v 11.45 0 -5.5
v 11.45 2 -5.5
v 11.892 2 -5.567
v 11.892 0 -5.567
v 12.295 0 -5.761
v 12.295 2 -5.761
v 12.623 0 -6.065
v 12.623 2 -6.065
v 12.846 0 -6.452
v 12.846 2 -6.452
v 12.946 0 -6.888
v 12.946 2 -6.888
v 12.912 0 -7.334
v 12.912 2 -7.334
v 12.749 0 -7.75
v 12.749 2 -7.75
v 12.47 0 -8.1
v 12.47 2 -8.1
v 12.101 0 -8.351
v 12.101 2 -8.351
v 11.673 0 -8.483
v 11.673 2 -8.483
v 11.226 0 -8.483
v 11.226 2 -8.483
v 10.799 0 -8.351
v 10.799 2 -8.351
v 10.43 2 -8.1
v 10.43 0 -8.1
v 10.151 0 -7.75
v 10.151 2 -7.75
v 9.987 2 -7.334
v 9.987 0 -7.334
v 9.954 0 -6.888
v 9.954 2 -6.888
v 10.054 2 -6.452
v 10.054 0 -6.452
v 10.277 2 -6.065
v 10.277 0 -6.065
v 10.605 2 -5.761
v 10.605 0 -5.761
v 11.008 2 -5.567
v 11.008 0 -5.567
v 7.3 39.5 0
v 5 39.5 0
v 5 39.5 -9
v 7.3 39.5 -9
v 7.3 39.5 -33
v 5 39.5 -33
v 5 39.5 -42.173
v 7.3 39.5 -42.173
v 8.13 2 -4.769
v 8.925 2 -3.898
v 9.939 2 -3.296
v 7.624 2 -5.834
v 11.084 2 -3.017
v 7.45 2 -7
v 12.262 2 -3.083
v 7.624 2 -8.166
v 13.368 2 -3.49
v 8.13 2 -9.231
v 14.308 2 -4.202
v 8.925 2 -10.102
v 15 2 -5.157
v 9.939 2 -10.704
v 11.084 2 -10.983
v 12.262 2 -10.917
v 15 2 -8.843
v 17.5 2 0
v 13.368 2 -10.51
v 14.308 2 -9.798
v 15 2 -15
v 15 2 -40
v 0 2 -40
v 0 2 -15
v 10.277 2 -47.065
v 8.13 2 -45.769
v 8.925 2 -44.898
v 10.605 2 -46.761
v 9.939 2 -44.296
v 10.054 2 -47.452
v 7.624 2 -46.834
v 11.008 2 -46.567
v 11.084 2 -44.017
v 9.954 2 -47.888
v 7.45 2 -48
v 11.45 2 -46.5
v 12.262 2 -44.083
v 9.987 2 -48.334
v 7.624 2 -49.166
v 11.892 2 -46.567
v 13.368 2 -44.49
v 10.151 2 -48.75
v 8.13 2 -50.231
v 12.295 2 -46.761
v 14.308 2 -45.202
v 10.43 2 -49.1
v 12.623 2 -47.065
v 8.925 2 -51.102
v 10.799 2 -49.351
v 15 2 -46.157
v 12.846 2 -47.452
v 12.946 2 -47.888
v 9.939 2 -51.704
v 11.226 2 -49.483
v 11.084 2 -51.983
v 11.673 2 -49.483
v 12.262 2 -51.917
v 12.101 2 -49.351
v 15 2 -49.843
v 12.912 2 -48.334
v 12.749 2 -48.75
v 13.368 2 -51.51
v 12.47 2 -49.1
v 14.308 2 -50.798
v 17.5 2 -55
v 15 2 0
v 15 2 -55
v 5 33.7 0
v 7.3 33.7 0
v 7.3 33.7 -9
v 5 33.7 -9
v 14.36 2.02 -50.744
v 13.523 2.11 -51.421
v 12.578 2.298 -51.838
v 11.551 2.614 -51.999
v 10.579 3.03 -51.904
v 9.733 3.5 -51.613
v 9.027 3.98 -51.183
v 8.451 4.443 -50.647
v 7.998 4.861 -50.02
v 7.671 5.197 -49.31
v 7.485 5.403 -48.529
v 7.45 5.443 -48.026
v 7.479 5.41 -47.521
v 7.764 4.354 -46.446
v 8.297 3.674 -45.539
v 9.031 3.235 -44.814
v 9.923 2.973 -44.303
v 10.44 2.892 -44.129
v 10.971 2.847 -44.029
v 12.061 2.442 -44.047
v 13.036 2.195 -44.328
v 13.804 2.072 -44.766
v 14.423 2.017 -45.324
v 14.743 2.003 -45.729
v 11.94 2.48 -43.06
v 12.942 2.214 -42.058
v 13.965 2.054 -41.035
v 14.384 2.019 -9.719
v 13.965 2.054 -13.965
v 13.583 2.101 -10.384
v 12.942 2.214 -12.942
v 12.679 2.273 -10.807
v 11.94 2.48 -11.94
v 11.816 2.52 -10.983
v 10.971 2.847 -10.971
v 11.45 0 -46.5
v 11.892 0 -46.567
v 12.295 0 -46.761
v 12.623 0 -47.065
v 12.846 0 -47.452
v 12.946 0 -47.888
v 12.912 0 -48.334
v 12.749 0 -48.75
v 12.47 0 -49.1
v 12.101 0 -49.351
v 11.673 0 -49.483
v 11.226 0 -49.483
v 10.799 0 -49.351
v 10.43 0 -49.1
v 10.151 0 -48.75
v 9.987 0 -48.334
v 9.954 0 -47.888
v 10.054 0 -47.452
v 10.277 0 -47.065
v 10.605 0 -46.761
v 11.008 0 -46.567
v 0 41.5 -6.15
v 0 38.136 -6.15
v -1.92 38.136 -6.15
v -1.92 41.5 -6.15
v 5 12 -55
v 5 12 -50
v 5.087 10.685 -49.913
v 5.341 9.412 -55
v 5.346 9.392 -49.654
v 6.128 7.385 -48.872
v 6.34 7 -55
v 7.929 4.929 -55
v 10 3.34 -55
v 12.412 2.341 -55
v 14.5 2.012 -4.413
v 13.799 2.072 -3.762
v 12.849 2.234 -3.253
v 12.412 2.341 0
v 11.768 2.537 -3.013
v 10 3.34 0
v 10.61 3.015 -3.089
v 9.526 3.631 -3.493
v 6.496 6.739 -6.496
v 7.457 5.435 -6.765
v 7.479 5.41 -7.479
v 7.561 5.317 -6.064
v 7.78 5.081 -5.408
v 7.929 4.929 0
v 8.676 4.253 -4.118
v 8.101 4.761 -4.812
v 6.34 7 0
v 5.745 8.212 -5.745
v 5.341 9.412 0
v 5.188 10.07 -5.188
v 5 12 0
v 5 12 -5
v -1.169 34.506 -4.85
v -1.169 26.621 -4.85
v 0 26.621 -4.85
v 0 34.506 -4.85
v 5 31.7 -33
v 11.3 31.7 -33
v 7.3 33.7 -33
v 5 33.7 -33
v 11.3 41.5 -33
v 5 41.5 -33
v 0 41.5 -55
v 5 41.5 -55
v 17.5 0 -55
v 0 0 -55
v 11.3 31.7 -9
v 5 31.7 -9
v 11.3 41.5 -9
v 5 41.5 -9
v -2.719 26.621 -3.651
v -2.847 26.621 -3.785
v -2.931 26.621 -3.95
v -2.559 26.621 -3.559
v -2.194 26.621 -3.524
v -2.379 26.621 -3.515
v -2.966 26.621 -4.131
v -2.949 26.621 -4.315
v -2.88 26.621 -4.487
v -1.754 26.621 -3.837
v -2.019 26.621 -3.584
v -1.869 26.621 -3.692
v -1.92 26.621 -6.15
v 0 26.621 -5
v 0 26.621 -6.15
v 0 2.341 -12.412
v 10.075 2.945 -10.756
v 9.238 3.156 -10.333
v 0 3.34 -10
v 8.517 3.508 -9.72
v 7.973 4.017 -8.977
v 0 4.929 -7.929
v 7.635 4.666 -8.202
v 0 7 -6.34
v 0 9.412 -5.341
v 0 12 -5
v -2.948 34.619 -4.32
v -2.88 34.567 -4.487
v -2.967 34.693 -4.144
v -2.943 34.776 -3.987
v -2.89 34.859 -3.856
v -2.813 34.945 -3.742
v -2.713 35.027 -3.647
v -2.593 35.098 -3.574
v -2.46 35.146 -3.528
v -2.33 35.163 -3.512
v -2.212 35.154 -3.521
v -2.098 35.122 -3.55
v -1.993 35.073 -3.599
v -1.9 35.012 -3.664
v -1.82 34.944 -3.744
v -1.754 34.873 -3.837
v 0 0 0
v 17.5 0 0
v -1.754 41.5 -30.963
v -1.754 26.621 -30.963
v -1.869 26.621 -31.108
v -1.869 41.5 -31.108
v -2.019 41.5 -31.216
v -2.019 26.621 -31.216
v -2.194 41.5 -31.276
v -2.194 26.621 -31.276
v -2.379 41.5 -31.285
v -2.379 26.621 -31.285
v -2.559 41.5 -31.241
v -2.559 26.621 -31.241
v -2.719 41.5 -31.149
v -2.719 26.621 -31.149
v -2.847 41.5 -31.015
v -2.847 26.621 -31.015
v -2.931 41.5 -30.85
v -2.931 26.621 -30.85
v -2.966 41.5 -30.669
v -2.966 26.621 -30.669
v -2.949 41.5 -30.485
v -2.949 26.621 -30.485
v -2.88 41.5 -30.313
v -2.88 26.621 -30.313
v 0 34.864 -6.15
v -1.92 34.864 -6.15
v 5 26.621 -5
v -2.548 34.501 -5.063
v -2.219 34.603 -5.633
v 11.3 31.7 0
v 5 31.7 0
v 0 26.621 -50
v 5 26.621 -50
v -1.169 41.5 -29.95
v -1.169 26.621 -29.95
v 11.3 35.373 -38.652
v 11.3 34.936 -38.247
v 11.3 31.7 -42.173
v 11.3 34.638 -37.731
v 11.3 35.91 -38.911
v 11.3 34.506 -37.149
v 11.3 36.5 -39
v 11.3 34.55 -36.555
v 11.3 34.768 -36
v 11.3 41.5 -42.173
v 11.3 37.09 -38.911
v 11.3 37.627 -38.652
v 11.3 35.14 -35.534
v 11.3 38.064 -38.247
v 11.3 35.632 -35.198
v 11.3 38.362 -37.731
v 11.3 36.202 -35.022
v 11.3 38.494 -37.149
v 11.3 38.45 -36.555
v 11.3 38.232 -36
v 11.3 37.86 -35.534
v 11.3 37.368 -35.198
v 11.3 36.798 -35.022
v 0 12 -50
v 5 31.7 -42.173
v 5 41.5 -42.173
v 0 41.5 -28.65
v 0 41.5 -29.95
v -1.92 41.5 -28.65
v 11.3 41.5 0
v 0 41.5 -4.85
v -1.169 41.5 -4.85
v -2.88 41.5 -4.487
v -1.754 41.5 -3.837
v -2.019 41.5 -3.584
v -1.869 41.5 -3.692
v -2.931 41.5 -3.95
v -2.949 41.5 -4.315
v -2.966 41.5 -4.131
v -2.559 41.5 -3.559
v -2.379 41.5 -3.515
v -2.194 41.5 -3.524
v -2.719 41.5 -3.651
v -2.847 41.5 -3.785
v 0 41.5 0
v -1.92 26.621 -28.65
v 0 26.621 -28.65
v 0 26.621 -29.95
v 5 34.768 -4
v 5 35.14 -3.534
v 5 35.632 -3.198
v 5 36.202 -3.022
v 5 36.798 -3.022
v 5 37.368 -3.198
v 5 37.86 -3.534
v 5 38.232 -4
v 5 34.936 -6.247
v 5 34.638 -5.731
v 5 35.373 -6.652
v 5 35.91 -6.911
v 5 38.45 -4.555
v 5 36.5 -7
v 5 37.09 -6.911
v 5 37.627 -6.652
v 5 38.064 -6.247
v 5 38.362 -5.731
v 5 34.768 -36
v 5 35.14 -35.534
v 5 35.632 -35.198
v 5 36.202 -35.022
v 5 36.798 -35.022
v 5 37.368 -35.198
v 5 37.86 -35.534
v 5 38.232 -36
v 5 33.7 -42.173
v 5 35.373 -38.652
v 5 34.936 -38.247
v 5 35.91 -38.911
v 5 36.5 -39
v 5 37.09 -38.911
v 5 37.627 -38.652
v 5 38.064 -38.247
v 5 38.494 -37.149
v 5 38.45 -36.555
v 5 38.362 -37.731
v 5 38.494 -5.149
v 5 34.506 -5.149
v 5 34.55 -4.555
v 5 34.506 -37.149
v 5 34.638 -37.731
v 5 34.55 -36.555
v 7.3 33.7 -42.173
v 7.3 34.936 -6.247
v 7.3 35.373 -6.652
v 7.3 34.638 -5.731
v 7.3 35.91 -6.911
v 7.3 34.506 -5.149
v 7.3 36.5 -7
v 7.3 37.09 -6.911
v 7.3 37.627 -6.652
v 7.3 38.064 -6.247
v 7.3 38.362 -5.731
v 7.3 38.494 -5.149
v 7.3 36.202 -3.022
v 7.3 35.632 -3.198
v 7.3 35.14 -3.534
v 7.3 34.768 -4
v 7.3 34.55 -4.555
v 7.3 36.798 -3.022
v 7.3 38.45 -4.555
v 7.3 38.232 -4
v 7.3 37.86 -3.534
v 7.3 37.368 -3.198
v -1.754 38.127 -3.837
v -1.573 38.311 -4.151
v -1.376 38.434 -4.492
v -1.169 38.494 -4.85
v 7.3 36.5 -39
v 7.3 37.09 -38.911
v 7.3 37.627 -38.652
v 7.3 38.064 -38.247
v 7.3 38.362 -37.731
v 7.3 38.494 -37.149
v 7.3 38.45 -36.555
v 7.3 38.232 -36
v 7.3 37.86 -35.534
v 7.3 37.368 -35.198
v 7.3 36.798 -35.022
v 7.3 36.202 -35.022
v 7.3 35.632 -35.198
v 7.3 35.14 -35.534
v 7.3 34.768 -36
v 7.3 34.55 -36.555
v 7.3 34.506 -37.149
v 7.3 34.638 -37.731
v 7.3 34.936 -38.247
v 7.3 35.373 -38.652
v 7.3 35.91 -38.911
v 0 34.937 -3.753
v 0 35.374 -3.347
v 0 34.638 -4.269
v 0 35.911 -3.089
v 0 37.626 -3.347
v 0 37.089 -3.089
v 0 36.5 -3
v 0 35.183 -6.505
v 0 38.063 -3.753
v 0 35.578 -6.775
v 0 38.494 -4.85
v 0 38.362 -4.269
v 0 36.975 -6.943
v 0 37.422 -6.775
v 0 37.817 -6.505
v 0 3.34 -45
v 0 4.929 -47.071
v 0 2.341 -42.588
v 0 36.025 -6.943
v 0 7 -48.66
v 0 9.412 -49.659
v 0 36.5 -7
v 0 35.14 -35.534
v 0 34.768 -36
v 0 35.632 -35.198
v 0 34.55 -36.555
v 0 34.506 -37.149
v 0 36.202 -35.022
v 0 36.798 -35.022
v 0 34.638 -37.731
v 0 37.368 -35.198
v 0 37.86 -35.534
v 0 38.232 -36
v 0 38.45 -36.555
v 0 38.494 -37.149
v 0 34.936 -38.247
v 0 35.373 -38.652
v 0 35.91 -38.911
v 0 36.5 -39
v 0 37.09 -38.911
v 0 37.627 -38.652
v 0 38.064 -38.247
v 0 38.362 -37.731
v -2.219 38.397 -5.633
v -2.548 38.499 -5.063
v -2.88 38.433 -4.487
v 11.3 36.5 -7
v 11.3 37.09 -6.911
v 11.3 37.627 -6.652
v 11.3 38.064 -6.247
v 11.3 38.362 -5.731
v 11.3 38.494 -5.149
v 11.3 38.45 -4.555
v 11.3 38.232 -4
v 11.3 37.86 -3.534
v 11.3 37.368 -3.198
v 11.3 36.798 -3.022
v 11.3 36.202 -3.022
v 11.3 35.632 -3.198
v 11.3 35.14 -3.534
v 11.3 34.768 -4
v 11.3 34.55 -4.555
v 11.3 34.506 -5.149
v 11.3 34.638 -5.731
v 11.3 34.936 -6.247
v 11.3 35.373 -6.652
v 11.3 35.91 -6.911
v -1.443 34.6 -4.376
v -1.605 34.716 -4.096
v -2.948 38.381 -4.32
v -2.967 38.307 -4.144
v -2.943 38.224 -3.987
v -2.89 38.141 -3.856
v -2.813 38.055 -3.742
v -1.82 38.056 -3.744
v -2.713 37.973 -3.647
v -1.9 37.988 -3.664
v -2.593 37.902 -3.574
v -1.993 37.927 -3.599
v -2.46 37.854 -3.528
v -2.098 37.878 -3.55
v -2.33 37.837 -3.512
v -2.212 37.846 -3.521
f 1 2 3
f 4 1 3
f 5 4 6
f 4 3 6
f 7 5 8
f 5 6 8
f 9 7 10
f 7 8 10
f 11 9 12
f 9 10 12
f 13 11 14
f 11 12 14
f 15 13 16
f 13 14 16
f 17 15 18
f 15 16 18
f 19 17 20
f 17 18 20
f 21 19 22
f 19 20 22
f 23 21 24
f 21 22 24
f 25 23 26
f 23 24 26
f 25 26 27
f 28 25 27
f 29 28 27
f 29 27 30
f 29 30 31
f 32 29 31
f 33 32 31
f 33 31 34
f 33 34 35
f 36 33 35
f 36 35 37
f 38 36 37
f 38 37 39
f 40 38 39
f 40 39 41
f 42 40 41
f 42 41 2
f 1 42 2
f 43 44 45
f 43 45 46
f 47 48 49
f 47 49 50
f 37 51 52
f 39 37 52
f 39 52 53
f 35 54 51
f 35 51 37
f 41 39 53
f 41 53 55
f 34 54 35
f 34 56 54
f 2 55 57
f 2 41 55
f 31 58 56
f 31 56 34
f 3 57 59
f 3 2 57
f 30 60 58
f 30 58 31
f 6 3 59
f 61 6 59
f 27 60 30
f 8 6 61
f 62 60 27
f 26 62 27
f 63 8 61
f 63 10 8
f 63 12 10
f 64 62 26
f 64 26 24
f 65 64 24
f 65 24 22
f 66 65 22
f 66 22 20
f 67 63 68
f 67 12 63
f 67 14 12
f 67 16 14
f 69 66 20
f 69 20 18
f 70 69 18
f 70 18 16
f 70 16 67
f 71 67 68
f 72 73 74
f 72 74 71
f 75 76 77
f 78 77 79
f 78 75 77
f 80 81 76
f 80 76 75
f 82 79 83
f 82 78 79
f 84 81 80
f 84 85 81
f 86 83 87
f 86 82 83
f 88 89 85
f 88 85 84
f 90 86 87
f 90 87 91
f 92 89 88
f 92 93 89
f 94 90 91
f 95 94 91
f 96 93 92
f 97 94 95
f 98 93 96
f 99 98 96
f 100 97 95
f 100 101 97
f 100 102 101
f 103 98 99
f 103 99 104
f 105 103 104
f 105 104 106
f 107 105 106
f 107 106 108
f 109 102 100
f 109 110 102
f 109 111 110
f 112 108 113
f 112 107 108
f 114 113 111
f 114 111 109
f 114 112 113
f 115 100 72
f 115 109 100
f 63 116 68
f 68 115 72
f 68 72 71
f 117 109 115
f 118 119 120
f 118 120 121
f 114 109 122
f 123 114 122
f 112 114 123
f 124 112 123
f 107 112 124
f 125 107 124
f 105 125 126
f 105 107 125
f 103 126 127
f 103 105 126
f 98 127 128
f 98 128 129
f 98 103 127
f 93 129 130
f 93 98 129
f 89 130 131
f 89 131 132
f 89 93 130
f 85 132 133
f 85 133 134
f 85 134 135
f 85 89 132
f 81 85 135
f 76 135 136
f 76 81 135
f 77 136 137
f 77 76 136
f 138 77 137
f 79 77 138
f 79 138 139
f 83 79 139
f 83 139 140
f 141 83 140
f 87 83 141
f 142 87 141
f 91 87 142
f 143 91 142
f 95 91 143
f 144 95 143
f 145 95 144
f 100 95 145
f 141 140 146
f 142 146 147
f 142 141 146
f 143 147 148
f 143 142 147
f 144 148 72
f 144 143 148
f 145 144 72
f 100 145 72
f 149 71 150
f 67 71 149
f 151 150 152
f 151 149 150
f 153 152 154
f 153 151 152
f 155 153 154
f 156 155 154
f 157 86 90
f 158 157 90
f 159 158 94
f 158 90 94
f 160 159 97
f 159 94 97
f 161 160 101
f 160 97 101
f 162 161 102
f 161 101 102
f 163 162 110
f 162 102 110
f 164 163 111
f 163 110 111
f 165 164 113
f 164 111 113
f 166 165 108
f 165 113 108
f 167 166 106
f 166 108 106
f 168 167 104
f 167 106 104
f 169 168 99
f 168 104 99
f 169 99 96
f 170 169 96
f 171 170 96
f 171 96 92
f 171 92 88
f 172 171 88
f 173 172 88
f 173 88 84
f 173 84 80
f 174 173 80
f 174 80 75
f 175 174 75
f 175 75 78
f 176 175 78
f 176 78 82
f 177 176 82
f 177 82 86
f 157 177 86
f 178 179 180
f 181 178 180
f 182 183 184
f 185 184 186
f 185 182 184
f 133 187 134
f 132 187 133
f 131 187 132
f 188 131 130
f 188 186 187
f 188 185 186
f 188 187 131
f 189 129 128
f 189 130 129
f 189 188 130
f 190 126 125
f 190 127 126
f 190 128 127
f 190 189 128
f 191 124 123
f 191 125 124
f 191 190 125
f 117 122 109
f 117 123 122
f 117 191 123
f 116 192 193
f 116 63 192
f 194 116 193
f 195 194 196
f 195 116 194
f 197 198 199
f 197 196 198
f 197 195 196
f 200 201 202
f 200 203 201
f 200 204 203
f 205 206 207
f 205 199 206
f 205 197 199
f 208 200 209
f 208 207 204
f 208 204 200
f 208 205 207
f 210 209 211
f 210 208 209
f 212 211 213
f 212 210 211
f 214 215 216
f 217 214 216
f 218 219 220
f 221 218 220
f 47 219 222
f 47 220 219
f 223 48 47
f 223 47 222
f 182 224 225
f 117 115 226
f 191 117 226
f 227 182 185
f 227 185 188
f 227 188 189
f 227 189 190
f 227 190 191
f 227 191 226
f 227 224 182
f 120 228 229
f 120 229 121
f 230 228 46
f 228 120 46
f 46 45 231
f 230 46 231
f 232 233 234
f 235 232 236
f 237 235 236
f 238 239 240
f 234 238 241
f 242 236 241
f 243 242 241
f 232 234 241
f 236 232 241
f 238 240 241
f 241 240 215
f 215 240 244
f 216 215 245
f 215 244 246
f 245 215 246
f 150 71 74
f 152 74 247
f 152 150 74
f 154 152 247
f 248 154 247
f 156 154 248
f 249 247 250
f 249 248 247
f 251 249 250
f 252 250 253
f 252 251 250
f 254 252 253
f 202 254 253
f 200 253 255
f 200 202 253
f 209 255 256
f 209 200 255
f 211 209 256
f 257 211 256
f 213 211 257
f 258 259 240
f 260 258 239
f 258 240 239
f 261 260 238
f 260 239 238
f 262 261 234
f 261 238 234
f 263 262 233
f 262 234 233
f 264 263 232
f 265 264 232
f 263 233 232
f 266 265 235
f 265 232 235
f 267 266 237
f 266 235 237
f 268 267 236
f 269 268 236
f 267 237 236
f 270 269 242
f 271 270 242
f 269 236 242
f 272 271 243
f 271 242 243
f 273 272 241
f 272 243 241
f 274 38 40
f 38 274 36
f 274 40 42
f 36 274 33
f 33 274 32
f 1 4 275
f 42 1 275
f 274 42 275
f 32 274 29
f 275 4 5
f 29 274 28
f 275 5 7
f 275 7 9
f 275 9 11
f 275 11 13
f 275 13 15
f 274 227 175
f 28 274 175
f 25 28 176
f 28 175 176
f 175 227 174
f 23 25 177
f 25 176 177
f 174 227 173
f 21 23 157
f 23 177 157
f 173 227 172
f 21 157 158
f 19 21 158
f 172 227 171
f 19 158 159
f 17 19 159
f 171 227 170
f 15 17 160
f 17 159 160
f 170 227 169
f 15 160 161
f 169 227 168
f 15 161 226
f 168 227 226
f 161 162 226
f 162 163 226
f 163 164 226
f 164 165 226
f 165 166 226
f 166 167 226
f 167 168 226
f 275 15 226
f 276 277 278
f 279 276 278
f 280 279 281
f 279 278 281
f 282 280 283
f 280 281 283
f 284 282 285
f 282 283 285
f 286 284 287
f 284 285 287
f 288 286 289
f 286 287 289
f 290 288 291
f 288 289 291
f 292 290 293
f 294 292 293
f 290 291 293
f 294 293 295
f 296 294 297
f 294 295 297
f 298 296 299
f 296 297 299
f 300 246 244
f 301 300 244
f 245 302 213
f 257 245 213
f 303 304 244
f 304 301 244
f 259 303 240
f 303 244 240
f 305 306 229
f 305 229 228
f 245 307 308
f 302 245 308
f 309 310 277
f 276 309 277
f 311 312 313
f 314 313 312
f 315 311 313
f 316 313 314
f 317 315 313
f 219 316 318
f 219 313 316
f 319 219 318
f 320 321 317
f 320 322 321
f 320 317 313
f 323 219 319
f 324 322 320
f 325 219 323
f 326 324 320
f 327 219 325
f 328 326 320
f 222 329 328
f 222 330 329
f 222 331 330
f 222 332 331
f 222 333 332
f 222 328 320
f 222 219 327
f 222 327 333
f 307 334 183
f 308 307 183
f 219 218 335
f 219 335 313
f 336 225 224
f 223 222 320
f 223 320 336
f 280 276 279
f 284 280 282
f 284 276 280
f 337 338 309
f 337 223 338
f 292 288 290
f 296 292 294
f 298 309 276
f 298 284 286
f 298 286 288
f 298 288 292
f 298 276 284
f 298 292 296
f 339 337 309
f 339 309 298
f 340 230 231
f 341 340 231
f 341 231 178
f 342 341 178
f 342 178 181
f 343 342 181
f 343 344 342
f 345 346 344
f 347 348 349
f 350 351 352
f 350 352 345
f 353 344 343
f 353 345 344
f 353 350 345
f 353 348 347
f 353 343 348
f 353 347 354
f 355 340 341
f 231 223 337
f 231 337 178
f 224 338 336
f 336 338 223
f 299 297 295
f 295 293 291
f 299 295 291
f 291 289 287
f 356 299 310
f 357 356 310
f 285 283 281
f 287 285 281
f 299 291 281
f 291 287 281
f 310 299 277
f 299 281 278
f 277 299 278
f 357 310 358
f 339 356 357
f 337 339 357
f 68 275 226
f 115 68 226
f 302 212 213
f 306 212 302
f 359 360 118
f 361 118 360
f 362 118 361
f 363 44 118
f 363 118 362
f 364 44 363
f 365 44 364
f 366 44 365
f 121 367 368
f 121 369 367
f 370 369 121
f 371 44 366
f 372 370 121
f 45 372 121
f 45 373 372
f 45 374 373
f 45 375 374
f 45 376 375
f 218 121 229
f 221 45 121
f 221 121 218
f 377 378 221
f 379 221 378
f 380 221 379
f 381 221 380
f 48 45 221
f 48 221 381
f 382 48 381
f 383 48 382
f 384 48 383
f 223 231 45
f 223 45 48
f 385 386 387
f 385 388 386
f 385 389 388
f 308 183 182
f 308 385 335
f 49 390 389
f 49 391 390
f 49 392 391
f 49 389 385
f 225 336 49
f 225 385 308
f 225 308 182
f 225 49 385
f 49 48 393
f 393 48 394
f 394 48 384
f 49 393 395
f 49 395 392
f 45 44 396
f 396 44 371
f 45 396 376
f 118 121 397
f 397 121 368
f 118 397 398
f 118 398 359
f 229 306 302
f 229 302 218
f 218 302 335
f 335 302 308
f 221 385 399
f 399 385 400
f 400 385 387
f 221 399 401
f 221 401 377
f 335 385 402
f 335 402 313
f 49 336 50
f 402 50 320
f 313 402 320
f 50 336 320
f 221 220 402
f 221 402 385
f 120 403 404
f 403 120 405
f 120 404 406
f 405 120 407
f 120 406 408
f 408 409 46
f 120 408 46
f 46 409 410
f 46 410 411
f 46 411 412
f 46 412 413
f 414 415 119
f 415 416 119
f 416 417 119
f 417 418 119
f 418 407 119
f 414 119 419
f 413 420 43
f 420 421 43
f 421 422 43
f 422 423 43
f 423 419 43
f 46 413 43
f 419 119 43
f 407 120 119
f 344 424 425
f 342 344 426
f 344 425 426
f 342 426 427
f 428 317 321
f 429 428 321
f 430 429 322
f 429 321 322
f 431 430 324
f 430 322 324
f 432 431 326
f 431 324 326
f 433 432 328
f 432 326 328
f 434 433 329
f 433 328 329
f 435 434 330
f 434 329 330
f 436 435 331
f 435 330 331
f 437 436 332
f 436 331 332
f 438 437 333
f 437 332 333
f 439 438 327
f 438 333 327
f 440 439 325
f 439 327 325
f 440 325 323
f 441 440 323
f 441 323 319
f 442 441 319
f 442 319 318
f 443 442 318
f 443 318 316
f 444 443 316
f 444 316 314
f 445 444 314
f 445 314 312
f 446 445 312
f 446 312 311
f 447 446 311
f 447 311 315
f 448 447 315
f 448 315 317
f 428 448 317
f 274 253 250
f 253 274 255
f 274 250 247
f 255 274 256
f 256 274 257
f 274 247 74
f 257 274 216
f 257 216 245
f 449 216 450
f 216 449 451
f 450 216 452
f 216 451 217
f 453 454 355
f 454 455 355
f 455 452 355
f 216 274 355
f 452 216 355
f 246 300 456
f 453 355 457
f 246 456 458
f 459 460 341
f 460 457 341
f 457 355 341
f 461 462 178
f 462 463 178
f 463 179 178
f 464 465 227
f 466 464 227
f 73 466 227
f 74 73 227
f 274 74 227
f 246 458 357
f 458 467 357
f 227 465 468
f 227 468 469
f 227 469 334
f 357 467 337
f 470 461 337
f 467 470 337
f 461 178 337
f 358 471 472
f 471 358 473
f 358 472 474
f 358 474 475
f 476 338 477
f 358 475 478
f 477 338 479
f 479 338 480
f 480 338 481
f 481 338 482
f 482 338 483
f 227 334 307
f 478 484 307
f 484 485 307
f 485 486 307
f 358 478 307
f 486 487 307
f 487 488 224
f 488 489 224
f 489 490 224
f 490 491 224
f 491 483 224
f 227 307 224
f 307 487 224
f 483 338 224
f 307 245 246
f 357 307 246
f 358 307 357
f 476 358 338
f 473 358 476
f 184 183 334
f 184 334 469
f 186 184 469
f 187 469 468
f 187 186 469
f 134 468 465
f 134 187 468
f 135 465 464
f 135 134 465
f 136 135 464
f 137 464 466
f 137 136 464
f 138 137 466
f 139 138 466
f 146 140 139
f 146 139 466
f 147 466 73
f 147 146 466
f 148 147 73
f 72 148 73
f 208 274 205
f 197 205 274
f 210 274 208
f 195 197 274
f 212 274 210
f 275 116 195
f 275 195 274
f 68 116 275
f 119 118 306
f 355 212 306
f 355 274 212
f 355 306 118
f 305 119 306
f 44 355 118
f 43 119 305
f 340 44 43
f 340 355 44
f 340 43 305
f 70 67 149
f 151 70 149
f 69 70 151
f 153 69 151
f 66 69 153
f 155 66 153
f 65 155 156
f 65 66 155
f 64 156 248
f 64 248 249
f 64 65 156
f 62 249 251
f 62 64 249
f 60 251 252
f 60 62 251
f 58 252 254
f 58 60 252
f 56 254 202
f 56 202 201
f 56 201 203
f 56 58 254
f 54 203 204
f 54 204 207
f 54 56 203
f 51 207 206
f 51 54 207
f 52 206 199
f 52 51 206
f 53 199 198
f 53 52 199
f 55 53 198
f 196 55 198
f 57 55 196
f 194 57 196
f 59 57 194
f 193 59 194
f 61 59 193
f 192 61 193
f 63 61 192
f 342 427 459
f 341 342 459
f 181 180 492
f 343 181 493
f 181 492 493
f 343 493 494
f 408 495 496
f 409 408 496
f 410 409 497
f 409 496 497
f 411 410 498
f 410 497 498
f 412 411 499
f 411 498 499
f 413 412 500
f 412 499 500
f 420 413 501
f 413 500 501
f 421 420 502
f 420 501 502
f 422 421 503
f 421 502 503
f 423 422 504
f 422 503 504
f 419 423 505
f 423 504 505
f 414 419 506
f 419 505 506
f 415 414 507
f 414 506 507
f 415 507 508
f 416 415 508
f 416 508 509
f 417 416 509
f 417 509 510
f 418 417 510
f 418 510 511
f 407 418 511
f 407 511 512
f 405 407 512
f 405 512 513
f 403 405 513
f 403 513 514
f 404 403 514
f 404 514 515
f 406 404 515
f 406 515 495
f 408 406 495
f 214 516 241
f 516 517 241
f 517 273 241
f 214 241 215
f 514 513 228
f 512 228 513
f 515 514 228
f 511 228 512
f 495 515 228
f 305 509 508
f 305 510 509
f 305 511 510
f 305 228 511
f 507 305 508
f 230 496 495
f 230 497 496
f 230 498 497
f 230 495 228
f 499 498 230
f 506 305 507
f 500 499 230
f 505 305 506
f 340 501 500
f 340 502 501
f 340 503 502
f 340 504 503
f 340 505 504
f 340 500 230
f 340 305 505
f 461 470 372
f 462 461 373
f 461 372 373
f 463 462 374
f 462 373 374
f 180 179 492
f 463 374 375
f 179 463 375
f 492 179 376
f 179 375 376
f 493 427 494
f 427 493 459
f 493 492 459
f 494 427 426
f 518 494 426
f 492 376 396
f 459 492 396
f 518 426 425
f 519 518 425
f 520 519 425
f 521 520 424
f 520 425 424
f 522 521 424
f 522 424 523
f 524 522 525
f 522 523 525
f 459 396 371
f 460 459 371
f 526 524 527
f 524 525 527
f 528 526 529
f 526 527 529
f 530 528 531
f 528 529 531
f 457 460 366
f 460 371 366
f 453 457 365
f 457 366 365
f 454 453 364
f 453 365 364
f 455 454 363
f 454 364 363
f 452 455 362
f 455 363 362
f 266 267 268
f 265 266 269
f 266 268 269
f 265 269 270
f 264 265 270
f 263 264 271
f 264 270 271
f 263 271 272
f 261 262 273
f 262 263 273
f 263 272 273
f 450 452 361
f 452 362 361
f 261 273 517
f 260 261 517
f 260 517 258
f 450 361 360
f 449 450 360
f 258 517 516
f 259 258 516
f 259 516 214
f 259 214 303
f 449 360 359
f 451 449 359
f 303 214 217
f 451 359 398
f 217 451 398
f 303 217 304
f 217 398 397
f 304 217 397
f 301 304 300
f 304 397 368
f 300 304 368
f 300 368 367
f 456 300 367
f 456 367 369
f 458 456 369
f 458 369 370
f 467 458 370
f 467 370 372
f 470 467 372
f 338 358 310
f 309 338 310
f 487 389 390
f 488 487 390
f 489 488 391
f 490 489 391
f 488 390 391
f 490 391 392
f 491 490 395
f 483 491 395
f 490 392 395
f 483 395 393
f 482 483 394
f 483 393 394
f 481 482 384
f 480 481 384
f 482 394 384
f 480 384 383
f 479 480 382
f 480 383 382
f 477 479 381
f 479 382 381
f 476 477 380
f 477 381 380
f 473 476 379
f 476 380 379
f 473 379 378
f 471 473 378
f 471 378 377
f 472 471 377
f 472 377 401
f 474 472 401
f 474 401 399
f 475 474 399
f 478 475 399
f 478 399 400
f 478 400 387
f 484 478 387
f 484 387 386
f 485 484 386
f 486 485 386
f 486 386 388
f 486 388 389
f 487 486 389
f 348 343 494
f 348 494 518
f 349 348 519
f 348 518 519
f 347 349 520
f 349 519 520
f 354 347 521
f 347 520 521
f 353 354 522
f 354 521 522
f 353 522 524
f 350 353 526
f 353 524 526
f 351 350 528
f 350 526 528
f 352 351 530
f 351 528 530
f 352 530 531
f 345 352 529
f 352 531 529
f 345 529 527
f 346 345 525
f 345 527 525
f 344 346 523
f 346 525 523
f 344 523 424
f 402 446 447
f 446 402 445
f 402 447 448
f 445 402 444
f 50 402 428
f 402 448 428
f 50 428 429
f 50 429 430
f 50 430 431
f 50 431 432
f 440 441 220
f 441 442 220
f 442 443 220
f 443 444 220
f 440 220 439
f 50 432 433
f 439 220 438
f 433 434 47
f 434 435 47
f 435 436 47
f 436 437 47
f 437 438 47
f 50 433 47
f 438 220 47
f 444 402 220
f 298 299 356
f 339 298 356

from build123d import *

# Parameters (mm, degrees)
SKETCH_1_W               = 17.5
SKETCH_1_H               = 55
EXTRUDE_1_DEPTH          = 2
SKETCH_2_W               = 5
SKETCH_2_H               = 5
EXTRUDE_2_DEPTH          = 33
EXTRUDE_3_DEPTH          = 6.5
EXTRUDE_3_DEPTH_BACK     = 8.378522314
SKETCH_3_W               = 5
SKETCH_3_H               = 55
SKETCH_4_R               = 1.5
CUT_EXTRUDE_1_DEPTH      = 10
FILLET_1_R               = 10
SKETCH_5_R               = 4
CUT_EXTRUDE_2_DEPTH      = 12
EXTRUDE_START            = -14.878522
EXTRUDE_4_DEPTH          = 14.878522
SKETCH_7_W               = 4
SKETCH_7_H               = 2
SKETCH_7_W_2             = 2.3
SKETCH_7_H_2             = 5.8
EXTRUDE_5_DEPTH          = 42.173435595
SKETCH_9_R               = 2
CUT_EXTRUDE_15_DEPTH     = 39
CUT_EXTRUDE_START        = -6.3
CUT_EXTRUDE_16_OUTLINE_W = 24
CUT_EXTRUDE_16_OUTLINE_H = 9.8
CUT_EXTRUDE_16_DEPTH     = 6.3


# Read off the part's stored shape, not the designer's step: Вырез-Вытянуть16
with BuildPart() as part:
    # Эскиз1 → Бобышка-Вытянуть1 (new body)
    with BuildSketch(Plane(origin=(0, 0, 0), x_dir=(1, 0, 0), z_dir=(0, 1, 0))):
        with Locations((8.75, 27.5)):
            Rectangle(SKETCH_1_W, SKETCH_1_H)
    extrude(amount=EXTRUDE_1_DEPTH)

    # Эскиз2 → Бобышка-Вытянуть2 (add)
    with BuildSketch(Plane(origin=(0, 2, 0), x_dir=(1, 0, 0), z_dir=(0, 1, 0))):
        with Locations((2.5, 52.5)):
            Rectangle(SKETCH_2_W, SKETCH_2_H)
        with Locations((2.5, 2.5)):
            Rectangle(SKETCH_2_W, SKETCH_2_H)
    extrude(amount=EXTRUDE_2_DEPTH)

    # Эскиз3 → Бобышка-Вытянуть3 (add, two sides: drawn at the far end of the back side and taken through both)
    with BuildSketch(Plane(origin=(0, 35, 0), x_dir=(1, 0, 0), z_dir=(0, 1, 0)).offset(-EXTRUDE_3_DEPTH_BACK)):
        with Locations((2.5, 27.5)):
            Rectangle(SKETCH_3_W, SKETCH_3_H)
    extrude(amount=EXTRUDE_3_DEPTH + EXTRUDE_3_DEPTH_BACK)

    # Эскиз4 → Вырез-Вытянуть1 (cut)
    with BuildSketch(Plane(origin=(0, 2, 0), x_dir=(1, 0, 0), z_dir=(0, 1, 0))):
        with Locations(Location((11.449842766, 48, 0), (0, 0, 270))):
            Circle(SKETCH_4_R)
        with Locations(Location((11.449842766, 7, 0), (0, 0, 270))):
            Circle(SKETCH_4_R)
    extrude(amount=-CUT_EXTRUDE_1_DEPTH, mode=Mode.SUBTRACT)

    # Скругление1
    # the kernel refuses this fillet: 10 mm, written as the material it adds along each edge
    with BuildSketch(Plane(origin=(5, 2, -50), x_dir=(0, 0, 1), z_dir=(-1, 0, 0)), Plane(origin=(5, 2, 0), x_dir=(0, 1, 0), z_dir=(0, 0, -1))) as fillet_1_piece_1:
        with BuildLine():
            CenterArc((FILLET_1_R, FILLET_1_R), FILLET_1_R, 180, 90)
            Line((0, FILLET_1_R), (0, 0))
            Line((0, 0), (FILLET_1_R, 0))
        make_face()
    extrude(amount=5)
    with BuildSketch(Plane(origin=(5, 2, -55), x_dir=(0, 1, 0), z_dir=(0, 0, 1)), Plane(origin=(5, 2, -5), x_dir=(0, 0, -1), z_dir=(-1, 0, 0))) as fillet_1_piece_2:
        with BuildLine():
            CenterArc((FILLET_1_R, -FILLET_1_R), FILLET_1_R, 90, 90)
            Line((0, -FILLET_1_R), (0, 0))
            Line((0, 0), (FILLET_1_R, 0))
        make_face()
    extrude(amount=5)
    with BuildSketch(Plane(origin=(5, 2, -55), x_dir=(0, 1, 0), z_dir=(0, 0, 1))) as fillet_1_piece_3a_section:
        with BuildLine():
            CenterArc((FILLET_1_R, -FILLET_1_R), FILLET_1_R, 90, 90)
            Line((0, -FILLET_1_R), (0, 0))
            Line((0, 0), (FILLET_1_R, 0))
        make_face()
    fillet_1_piece_3a = extrude(amount=30, mode=Mode.PRIVATE)
    fillet_1_piece_3a = split(fillet_1_piece_3a, bisect_by=Plane(origin=(7.224830191, 4.283537978, -50), z_dir=(0, 0, 1)), keep=Keep.TOP, mode=Mode.PRIVATE)
    fillet_1_piece_3a = fillet_1_piece_3a - Plane(origin=(11.449842766, 4.283537978, -48), x_dir=(0, 0, 1), z_dir=(0, 1, 0)) * Cylinder(1.5, 100, mode=Mode.PRIVATE)
    with BuildSketch(Plane(origin=(30, 2, -50), x_dir=(0, 0, 1), z_dir=(-1, 0, 0))) as fillet_1_piece_3b_section:
        with BuildLine():
            CenterArc((FILLET_1_R, FILLET_1_R), FILLET_1_R, 180, 90)
            Line((0, FILLET_1_R), (0, 0))
            Line((0, 0), (FILLET_1_R, 0))
        make_face()
    fillet_1_piece_3b = extrude(amount=30, mode=Mode.PRIVATE)
    fillet_1_piece_3b = split(fillet_1_piece_3b, bisect_by=Plane(origin=(5, 2.276950555, -42.605283247), z_dir=(1, 0, 0)), keep=Keep.TOP, mode=Mode.PRIVATE)
    fillet_1_piece_3b = split(fillet_1_piece_3b, bisect_by=Plane(origin=(17.5, 2.276950555, -42.605283247), z_dir=(-1, 0, 0)), keep=Keep.TOP, mode=Mode.PRIVATE)
    fillet_1_piece_3b = fillet_1_piece_3b - Plane(origin=(11.449842766, 2.276950555, -48), x_dir=(0, 0, 1), z_dir=(0, 1, 0)) * Cylinder(1.5, 100, mode=Mode.PRIVATE)
    fillet_1_piece_3 = fillet_1_piece_3a & fillet_1_piece_3b
    add(fillet_1_piece_3)
    with BuildSketch(Plane(origin=(5, 2, 0), x_dir=(0, 1, 0), z_dir=(0, 0, -1))) as fillet_1_piece_4a_section:
        with BuildLine():
            CenterArc((FILLET_1_R, FILLET_1_R), FILLET_1_R, 180, 90)
            Line((0, FILLET_1_R), (0, 0))
            Line((0, 0), (FILLET_1_R, 0))
        make_face()
    fillet_1_piece_4a = extrude(amount=30, mode=Mode.PRIVATE)
    fillet_1_piece_4a = split(fillet_1_piece_4a, bisect_by=Plane(origin=(7.224831151, 4.283537771, -5), z_dir=(0, 0, -1)), keep=Keep.TOP, mode=Mode.PRIVATE)
    fillet_1_piece_4a = fillet_1_piece_4a - Plane(origin=(11.449842766, 4.283537771, -7), x_dir=(0, 0, 1), z_dir=(0, 1, 0)) * Cylinder(1.5, 100, mode=Mode.PRIVATE)
    with BuildSketch(Plane(origin=(30, 2, -5), x_dir=(0, 0, -1), z_dir=(-1, 0, 0))) as fillet_1_piece_4b_section:
        with BuildLine():
            CenterArc((FILLET_1_R, -FILLET_1_R), FILLET_1_R, 90, 90)
            Line((0, -FILLET_1_R), (0, 0))
            Line((0, 0), (FILLET_1_R, 0))
        make_face()
    fillet_1_piece_4b = extrude(amount=30, mode=Mode.PRIVATE)
    fillet_1_piece_4b = split(fillet_1_piece_4b, bisect_by=Plane(origin=(5, 2.276949142, -12.394716375), z_dir=(1, 0, 0)), keep=Keep.TOP, mode=Mode.PRIVATE)
    fillet_1_piece_4b = split(fillet_1_piece_4b, bisect_by=Plane(origin=(17.5, 2.276949142, -12.394716375), z_dir=(-1, 0, 0)), keep=Keep.TOP, mode=Mode.PRIVATE)
    fillet_1_piece_4b = fillet_1_piece_4b - Plane(origin=(11.449842766, 2.276949142, -7), x_dir=(0, 0, 1), z_dir=(0, 1, 0)) * Cylinder(1.5, 100, mode=Mode.PRIVATE)
    fillet_1_piece_4 = fillet_1_piece_4a & fillet_1_piece_4b
    add(fillet_1_piece_4)

    # Эскиз5 → Вырез-Вытянуть2 (cut)
    with BuildSketch(Plane(origin=(0, 2, 0), x_dir=(1, 0, 0), z_dir=(0, 1, 0))):
        with Locations((11.449842766, 48)):
            Circle(SKETCH_5_R)
        with Locations((11.449842766, 7)):
            Circle(SKETCH_5_R)
    extrude(amount=CUT_EXTRUDE_2_DEPTH, mode=Mode.SUBTRACT)

    # Эскиз6 → Бобышка-Вытянуть4 (add)
    with BuildSketch(Plane(origin=(0, 41.5, 0), x_dir=(1, 0, 0), z_dir=(0, 1, 0)).offset(EXTRUDE_START)):
        with BuildLine():
            Line((0, 4.85), (0, 6.15))
            Line((0, 6.15), (-1.92, 6.15))
            Line((-1.92, 6.15), (-2.88, 4.487231225))
            ThreePointArc((-2.88, 4.487231225), (-2.642083488, 3.599314712), (-1.754166975, 3.837231225))
            Line((-1.754166975, 3.837231225), (-1.16944465, 4.85))
            Line((-1.16944465, 4.85), (0, 4.85))
        make_face()
        with BuildLine():
            Line((0, 28.65), (0, 29.95))
            Line((0, 29.95), (-1.16944465, 29.95))
            Line((-1.16944465, 29.95), (-1.754166975, 30.962768775))
            ThreePointArc((-1.754166975, 30.962768775), (-2.642083488, 31.200685288), (-2.88, 30.312768775))
            Line((-2.88, 30.312768775), (-1.92, 28.65))
            Line((-1.92, 28.65), (0, 28.65))
        make_face()
    extrude(amount=EXTRUDE_4_DEPTH)

    # Эскиз7 → Бобышка-Вытянуть5 (add)
    with BuildSketch(Plane.XY):
        with Locations((9.3, 40.5)):
            Rectangle(SKETCH_7_W, SKETCH_7_H)
        with Locations((6.15, 40.5)):
            Rectangle(SKETCH_7_W_2, SKETCH_7_H)
        with Locations((9.3, 36.6)):
            Rectangle(SKETCH_7_W, SKETCH_7_H_2)
        Polygon((7.3, 33.7), (5, 33.7), (5, 31.7), (11.3, 31.7), (11.3, 33.7), align=None)
    extrude(amount=-EXTRUDE_5_DEPTH)

    # Эскиз9 → Вырез-Вытянуть15 (cut)
    with BuildSketch(Plane(origin=(11.3, 0, 0), x_dir=(0, 0, -1), z_dir=(1, 0, 0))):
        with Locations((37, 36.5)):
            Circle(SKETCH_9_R)
        with Locations((5, 36.5)):
            Circle(SKETCH_9_R)
    extrude(amount=-CUT_EXTRUDE_15_DEPTH, mode=Mode.SUBTRACT)

    # Вырез-Вытянуть16 outline → Вырез-Вытянуть16 (cut)
    with BuildSketch(Plane(origin=(11.3, 0, 0), x_dir=(0, 0, -1), z_dir=(1, 0, 0)).offset(CUT_EXTRUDE_START)):
        with Locations((21, 36.6)):
            Rectangle(CUT_EXTRUDE_16_OUTLINE_W, CUT_EXTRUDE_16_OUTLINE_H)
    extrude(amount=CUT_EXTRUDE_16_DEPTH, mode=Mode.SUBTRACT)


solid = part.part
